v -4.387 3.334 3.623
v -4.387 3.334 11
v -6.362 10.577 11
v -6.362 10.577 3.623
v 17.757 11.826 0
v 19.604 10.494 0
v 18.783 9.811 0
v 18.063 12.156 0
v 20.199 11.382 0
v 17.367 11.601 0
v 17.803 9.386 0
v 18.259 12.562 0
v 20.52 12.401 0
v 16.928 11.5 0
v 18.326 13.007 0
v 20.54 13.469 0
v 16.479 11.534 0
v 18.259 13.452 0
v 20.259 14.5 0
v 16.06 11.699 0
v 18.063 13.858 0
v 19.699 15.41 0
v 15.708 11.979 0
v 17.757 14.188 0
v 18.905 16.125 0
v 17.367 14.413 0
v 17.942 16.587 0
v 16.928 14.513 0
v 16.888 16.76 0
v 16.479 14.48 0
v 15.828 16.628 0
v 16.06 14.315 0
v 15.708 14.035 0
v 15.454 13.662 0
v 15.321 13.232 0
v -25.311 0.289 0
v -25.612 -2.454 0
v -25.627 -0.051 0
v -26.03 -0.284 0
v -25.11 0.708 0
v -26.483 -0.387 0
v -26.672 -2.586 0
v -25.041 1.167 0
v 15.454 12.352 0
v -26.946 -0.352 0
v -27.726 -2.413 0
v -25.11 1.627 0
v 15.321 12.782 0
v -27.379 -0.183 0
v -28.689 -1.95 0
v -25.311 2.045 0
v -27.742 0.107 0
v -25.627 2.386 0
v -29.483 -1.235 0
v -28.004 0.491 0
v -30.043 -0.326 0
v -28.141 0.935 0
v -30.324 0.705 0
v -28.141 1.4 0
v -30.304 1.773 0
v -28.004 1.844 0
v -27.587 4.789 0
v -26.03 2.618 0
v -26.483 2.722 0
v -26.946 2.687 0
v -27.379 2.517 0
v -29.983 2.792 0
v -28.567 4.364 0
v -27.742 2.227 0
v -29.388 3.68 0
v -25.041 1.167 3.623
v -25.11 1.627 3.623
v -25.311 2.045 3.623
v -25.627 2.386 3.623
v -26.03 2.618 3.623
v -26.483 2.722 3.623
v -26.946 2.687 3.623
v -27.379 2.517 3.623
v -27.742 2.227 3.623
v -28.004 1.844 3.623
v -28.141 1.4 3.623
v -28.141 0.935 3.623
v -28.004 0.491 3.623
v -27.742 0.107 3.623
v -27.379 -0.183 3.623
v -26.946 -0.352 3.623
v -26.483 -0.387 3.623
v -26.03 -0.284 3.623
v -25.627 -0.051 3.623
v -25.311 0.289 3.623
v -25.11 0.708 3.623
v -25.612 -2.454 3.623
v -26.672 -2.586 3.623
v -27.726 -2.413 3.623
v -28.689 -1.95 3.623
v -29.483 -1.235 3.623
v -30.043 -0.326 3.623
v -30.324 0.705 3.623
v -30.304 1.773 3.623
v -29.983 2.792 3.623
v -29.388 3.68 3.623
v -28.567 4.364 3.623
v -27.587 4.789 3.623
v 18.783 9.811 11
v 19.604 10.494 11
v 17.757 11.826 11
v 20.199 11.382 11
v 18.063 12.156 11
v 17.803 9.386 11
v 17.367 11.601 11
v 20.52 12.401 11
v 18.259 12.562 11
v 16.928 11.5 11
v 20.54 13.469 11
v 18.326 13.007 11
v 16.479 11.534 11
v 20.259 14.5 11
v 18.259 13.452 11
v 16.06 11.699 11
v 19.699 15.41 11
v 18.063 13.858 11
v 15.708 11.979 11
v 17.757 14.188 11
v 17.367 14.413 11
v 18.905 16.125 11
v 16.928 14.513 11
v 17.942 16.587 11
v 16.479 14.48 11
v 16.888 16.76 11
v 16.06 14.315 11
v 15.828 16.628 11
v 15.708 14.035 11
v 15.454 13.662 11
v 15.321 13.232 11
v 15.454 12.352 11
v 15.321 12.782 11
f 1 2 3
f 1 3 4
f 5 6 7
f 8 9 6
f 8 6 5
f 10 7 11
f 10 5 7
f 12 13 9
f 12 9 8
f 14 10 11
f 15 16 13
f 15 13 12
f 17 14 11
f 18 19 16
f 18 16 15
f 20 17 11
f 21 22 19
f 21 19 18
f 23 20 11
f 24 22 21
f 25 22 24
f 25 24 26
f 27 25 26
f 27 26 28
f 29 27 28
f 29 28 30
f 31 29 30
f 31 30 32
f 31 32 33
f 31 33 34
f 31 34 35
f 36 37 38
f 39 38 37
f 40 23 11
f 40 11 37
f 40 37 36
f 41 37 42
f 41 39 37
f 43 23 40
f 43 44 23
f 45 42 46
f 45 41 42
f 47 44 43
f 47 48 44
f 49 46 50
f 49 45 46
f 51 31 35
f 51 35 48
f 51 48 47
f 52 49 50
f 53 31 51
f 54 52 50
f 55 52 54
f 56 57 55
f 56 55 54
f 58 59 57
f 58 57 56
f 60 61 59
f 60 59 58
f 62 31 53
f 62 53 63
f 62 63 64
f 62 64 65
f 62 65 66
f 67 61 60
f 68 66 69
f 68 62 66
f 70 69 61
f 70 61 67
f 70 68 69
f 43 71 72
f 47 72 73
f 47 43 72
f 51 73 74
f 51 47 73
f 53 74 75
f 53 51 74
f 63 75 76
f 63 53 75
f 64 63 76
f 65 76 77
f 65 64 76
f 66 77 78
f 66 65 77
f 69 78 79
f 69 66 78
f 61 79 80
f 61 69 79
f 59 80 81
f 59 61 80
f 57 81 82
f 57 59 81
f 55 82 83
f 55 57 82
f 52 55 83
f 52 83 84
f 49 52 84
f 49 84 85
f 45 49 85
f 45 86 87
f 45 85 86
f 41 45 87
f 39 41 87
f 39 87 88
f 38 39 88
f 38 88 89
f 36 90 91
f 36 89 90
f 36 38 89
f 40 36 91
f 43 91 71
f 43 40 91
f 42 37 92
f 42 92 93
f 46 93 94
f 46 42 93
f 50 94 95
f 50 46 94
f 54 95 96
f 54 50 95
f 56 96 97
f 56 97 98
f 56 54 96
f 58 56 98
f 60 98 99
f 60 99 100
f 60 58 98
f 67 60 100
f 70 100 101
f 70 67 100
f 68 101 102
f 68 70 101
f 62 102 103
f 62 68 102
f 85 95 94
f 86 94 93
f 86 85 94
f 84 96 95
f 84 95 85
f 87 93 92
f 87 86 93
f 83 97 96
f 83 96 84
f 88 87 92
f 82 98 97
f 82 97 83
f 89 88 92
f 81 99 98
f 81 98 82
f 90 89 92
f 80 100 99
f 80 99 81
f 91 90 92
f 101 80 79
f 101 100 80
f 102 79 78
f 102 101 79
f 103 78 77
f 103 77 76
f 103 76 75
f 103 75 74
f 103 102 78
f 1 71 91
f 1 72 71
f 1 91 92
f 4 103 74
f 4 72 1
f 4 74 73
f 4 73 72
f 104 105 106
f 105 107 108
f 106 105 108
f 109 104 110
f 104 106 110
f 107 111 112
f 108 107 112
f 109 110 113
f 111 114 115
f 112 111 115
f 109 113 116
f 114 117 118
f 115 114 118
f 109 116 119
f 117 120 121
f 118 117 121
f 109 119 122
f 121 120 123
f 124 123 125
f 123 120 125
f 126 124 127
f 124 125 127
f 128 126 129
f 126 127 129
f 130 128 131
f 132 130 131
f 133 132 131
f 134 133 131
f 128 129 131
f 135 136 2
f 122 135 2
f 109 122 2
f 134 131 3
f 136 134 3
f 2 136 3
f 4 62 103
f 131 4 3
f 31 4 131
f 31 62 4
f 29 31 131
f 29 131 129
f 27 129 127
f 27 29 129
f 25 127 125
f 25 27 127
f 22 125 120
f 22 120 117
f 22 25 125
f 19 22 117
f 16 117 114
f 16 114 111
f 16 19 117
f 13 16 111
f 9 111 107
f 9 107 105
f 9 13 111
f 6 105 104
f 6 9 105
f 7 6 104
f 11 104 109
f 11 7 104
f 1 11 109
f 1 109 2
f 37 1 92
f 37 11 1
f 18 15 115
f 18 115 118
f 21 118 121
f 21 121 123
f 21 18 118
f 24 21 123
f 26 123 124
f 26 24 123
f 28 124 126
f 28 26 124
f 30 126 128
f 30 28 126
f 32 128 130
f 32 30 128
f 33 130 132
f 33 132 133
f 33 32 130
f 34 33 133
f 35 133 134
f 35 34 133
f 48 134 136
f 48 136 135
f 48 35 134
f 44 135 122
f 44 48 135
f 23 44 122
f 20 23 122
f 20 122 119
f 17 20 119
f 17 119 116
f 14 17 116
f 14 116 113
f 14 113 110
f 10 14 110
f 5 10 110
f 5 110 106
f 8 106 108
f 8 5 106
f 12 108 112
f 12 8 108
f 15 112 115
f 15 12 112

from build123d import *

# Parameters (mm, degrees)
ESQUISSE1_R             = 1.558671709
ESQUISSE1_R_2           = 1.510734584
BOSS_EXTRU_1_DEPTH      = 11
ESQUISSE2_W             = 30
ESQUISSE2_H             = 7.376780582
ENL_V_MAT_EXTRU_1_DEPTH = 10


with BuildPart() as part:
    # Esquisse1 → Boss.-Extru.1 (new body)
    with BuildSketch(Plane.XY):
        with BuildLine():
            Line((-27.586844937, 4.788639913), (15.827697586, 16.628297741))
            ThreePointArc((15.827697586, 16.628297741), (20.43658301, 13.99456085), (17.802846119, 9.385675426))
            Line((17.802846119, 9.385675426), (-25.611696404, -2.453982402))
            ThreePointArc((-25.611696404, -2.453982402), (-30.220581828, 0.179754489), (-27.586844937, 4.788639913))
        make_face()
        with Locations((-26.599270671, 1.167328755)):
            Circle(ESQUISSE1_R, mode=Mode.SUBTRACT)
        with Locations((16.815271853, 13.006986583)):
            Circle(ESQUISSE1_R_2, mode=Mode.SUBTRACT)
    extrude(amount=BOSS_EXTRU_1_DEPTH)

    # Esquisse2 → Enlèv. mat.-Extru.1 (cut)
    with BuildSketch(Plane(origin=(-3.125175124, 11.4596258, 0), x_dir=(0.9647676116315722, 0.2631035072869839, 0), z_dir=(-0.2631035072869839, 0.9647676116315722, 0))):
        with Locations((-18.354986546, -7.311609709)):
            Rectangle(ESQUISSE2_W, ESQUISSE2_H)
    extrude(amount=-ENL_V_MAT_EXTRU_1_DEPTH, mode=Mode.SUBTRACT)


solid = part.part
